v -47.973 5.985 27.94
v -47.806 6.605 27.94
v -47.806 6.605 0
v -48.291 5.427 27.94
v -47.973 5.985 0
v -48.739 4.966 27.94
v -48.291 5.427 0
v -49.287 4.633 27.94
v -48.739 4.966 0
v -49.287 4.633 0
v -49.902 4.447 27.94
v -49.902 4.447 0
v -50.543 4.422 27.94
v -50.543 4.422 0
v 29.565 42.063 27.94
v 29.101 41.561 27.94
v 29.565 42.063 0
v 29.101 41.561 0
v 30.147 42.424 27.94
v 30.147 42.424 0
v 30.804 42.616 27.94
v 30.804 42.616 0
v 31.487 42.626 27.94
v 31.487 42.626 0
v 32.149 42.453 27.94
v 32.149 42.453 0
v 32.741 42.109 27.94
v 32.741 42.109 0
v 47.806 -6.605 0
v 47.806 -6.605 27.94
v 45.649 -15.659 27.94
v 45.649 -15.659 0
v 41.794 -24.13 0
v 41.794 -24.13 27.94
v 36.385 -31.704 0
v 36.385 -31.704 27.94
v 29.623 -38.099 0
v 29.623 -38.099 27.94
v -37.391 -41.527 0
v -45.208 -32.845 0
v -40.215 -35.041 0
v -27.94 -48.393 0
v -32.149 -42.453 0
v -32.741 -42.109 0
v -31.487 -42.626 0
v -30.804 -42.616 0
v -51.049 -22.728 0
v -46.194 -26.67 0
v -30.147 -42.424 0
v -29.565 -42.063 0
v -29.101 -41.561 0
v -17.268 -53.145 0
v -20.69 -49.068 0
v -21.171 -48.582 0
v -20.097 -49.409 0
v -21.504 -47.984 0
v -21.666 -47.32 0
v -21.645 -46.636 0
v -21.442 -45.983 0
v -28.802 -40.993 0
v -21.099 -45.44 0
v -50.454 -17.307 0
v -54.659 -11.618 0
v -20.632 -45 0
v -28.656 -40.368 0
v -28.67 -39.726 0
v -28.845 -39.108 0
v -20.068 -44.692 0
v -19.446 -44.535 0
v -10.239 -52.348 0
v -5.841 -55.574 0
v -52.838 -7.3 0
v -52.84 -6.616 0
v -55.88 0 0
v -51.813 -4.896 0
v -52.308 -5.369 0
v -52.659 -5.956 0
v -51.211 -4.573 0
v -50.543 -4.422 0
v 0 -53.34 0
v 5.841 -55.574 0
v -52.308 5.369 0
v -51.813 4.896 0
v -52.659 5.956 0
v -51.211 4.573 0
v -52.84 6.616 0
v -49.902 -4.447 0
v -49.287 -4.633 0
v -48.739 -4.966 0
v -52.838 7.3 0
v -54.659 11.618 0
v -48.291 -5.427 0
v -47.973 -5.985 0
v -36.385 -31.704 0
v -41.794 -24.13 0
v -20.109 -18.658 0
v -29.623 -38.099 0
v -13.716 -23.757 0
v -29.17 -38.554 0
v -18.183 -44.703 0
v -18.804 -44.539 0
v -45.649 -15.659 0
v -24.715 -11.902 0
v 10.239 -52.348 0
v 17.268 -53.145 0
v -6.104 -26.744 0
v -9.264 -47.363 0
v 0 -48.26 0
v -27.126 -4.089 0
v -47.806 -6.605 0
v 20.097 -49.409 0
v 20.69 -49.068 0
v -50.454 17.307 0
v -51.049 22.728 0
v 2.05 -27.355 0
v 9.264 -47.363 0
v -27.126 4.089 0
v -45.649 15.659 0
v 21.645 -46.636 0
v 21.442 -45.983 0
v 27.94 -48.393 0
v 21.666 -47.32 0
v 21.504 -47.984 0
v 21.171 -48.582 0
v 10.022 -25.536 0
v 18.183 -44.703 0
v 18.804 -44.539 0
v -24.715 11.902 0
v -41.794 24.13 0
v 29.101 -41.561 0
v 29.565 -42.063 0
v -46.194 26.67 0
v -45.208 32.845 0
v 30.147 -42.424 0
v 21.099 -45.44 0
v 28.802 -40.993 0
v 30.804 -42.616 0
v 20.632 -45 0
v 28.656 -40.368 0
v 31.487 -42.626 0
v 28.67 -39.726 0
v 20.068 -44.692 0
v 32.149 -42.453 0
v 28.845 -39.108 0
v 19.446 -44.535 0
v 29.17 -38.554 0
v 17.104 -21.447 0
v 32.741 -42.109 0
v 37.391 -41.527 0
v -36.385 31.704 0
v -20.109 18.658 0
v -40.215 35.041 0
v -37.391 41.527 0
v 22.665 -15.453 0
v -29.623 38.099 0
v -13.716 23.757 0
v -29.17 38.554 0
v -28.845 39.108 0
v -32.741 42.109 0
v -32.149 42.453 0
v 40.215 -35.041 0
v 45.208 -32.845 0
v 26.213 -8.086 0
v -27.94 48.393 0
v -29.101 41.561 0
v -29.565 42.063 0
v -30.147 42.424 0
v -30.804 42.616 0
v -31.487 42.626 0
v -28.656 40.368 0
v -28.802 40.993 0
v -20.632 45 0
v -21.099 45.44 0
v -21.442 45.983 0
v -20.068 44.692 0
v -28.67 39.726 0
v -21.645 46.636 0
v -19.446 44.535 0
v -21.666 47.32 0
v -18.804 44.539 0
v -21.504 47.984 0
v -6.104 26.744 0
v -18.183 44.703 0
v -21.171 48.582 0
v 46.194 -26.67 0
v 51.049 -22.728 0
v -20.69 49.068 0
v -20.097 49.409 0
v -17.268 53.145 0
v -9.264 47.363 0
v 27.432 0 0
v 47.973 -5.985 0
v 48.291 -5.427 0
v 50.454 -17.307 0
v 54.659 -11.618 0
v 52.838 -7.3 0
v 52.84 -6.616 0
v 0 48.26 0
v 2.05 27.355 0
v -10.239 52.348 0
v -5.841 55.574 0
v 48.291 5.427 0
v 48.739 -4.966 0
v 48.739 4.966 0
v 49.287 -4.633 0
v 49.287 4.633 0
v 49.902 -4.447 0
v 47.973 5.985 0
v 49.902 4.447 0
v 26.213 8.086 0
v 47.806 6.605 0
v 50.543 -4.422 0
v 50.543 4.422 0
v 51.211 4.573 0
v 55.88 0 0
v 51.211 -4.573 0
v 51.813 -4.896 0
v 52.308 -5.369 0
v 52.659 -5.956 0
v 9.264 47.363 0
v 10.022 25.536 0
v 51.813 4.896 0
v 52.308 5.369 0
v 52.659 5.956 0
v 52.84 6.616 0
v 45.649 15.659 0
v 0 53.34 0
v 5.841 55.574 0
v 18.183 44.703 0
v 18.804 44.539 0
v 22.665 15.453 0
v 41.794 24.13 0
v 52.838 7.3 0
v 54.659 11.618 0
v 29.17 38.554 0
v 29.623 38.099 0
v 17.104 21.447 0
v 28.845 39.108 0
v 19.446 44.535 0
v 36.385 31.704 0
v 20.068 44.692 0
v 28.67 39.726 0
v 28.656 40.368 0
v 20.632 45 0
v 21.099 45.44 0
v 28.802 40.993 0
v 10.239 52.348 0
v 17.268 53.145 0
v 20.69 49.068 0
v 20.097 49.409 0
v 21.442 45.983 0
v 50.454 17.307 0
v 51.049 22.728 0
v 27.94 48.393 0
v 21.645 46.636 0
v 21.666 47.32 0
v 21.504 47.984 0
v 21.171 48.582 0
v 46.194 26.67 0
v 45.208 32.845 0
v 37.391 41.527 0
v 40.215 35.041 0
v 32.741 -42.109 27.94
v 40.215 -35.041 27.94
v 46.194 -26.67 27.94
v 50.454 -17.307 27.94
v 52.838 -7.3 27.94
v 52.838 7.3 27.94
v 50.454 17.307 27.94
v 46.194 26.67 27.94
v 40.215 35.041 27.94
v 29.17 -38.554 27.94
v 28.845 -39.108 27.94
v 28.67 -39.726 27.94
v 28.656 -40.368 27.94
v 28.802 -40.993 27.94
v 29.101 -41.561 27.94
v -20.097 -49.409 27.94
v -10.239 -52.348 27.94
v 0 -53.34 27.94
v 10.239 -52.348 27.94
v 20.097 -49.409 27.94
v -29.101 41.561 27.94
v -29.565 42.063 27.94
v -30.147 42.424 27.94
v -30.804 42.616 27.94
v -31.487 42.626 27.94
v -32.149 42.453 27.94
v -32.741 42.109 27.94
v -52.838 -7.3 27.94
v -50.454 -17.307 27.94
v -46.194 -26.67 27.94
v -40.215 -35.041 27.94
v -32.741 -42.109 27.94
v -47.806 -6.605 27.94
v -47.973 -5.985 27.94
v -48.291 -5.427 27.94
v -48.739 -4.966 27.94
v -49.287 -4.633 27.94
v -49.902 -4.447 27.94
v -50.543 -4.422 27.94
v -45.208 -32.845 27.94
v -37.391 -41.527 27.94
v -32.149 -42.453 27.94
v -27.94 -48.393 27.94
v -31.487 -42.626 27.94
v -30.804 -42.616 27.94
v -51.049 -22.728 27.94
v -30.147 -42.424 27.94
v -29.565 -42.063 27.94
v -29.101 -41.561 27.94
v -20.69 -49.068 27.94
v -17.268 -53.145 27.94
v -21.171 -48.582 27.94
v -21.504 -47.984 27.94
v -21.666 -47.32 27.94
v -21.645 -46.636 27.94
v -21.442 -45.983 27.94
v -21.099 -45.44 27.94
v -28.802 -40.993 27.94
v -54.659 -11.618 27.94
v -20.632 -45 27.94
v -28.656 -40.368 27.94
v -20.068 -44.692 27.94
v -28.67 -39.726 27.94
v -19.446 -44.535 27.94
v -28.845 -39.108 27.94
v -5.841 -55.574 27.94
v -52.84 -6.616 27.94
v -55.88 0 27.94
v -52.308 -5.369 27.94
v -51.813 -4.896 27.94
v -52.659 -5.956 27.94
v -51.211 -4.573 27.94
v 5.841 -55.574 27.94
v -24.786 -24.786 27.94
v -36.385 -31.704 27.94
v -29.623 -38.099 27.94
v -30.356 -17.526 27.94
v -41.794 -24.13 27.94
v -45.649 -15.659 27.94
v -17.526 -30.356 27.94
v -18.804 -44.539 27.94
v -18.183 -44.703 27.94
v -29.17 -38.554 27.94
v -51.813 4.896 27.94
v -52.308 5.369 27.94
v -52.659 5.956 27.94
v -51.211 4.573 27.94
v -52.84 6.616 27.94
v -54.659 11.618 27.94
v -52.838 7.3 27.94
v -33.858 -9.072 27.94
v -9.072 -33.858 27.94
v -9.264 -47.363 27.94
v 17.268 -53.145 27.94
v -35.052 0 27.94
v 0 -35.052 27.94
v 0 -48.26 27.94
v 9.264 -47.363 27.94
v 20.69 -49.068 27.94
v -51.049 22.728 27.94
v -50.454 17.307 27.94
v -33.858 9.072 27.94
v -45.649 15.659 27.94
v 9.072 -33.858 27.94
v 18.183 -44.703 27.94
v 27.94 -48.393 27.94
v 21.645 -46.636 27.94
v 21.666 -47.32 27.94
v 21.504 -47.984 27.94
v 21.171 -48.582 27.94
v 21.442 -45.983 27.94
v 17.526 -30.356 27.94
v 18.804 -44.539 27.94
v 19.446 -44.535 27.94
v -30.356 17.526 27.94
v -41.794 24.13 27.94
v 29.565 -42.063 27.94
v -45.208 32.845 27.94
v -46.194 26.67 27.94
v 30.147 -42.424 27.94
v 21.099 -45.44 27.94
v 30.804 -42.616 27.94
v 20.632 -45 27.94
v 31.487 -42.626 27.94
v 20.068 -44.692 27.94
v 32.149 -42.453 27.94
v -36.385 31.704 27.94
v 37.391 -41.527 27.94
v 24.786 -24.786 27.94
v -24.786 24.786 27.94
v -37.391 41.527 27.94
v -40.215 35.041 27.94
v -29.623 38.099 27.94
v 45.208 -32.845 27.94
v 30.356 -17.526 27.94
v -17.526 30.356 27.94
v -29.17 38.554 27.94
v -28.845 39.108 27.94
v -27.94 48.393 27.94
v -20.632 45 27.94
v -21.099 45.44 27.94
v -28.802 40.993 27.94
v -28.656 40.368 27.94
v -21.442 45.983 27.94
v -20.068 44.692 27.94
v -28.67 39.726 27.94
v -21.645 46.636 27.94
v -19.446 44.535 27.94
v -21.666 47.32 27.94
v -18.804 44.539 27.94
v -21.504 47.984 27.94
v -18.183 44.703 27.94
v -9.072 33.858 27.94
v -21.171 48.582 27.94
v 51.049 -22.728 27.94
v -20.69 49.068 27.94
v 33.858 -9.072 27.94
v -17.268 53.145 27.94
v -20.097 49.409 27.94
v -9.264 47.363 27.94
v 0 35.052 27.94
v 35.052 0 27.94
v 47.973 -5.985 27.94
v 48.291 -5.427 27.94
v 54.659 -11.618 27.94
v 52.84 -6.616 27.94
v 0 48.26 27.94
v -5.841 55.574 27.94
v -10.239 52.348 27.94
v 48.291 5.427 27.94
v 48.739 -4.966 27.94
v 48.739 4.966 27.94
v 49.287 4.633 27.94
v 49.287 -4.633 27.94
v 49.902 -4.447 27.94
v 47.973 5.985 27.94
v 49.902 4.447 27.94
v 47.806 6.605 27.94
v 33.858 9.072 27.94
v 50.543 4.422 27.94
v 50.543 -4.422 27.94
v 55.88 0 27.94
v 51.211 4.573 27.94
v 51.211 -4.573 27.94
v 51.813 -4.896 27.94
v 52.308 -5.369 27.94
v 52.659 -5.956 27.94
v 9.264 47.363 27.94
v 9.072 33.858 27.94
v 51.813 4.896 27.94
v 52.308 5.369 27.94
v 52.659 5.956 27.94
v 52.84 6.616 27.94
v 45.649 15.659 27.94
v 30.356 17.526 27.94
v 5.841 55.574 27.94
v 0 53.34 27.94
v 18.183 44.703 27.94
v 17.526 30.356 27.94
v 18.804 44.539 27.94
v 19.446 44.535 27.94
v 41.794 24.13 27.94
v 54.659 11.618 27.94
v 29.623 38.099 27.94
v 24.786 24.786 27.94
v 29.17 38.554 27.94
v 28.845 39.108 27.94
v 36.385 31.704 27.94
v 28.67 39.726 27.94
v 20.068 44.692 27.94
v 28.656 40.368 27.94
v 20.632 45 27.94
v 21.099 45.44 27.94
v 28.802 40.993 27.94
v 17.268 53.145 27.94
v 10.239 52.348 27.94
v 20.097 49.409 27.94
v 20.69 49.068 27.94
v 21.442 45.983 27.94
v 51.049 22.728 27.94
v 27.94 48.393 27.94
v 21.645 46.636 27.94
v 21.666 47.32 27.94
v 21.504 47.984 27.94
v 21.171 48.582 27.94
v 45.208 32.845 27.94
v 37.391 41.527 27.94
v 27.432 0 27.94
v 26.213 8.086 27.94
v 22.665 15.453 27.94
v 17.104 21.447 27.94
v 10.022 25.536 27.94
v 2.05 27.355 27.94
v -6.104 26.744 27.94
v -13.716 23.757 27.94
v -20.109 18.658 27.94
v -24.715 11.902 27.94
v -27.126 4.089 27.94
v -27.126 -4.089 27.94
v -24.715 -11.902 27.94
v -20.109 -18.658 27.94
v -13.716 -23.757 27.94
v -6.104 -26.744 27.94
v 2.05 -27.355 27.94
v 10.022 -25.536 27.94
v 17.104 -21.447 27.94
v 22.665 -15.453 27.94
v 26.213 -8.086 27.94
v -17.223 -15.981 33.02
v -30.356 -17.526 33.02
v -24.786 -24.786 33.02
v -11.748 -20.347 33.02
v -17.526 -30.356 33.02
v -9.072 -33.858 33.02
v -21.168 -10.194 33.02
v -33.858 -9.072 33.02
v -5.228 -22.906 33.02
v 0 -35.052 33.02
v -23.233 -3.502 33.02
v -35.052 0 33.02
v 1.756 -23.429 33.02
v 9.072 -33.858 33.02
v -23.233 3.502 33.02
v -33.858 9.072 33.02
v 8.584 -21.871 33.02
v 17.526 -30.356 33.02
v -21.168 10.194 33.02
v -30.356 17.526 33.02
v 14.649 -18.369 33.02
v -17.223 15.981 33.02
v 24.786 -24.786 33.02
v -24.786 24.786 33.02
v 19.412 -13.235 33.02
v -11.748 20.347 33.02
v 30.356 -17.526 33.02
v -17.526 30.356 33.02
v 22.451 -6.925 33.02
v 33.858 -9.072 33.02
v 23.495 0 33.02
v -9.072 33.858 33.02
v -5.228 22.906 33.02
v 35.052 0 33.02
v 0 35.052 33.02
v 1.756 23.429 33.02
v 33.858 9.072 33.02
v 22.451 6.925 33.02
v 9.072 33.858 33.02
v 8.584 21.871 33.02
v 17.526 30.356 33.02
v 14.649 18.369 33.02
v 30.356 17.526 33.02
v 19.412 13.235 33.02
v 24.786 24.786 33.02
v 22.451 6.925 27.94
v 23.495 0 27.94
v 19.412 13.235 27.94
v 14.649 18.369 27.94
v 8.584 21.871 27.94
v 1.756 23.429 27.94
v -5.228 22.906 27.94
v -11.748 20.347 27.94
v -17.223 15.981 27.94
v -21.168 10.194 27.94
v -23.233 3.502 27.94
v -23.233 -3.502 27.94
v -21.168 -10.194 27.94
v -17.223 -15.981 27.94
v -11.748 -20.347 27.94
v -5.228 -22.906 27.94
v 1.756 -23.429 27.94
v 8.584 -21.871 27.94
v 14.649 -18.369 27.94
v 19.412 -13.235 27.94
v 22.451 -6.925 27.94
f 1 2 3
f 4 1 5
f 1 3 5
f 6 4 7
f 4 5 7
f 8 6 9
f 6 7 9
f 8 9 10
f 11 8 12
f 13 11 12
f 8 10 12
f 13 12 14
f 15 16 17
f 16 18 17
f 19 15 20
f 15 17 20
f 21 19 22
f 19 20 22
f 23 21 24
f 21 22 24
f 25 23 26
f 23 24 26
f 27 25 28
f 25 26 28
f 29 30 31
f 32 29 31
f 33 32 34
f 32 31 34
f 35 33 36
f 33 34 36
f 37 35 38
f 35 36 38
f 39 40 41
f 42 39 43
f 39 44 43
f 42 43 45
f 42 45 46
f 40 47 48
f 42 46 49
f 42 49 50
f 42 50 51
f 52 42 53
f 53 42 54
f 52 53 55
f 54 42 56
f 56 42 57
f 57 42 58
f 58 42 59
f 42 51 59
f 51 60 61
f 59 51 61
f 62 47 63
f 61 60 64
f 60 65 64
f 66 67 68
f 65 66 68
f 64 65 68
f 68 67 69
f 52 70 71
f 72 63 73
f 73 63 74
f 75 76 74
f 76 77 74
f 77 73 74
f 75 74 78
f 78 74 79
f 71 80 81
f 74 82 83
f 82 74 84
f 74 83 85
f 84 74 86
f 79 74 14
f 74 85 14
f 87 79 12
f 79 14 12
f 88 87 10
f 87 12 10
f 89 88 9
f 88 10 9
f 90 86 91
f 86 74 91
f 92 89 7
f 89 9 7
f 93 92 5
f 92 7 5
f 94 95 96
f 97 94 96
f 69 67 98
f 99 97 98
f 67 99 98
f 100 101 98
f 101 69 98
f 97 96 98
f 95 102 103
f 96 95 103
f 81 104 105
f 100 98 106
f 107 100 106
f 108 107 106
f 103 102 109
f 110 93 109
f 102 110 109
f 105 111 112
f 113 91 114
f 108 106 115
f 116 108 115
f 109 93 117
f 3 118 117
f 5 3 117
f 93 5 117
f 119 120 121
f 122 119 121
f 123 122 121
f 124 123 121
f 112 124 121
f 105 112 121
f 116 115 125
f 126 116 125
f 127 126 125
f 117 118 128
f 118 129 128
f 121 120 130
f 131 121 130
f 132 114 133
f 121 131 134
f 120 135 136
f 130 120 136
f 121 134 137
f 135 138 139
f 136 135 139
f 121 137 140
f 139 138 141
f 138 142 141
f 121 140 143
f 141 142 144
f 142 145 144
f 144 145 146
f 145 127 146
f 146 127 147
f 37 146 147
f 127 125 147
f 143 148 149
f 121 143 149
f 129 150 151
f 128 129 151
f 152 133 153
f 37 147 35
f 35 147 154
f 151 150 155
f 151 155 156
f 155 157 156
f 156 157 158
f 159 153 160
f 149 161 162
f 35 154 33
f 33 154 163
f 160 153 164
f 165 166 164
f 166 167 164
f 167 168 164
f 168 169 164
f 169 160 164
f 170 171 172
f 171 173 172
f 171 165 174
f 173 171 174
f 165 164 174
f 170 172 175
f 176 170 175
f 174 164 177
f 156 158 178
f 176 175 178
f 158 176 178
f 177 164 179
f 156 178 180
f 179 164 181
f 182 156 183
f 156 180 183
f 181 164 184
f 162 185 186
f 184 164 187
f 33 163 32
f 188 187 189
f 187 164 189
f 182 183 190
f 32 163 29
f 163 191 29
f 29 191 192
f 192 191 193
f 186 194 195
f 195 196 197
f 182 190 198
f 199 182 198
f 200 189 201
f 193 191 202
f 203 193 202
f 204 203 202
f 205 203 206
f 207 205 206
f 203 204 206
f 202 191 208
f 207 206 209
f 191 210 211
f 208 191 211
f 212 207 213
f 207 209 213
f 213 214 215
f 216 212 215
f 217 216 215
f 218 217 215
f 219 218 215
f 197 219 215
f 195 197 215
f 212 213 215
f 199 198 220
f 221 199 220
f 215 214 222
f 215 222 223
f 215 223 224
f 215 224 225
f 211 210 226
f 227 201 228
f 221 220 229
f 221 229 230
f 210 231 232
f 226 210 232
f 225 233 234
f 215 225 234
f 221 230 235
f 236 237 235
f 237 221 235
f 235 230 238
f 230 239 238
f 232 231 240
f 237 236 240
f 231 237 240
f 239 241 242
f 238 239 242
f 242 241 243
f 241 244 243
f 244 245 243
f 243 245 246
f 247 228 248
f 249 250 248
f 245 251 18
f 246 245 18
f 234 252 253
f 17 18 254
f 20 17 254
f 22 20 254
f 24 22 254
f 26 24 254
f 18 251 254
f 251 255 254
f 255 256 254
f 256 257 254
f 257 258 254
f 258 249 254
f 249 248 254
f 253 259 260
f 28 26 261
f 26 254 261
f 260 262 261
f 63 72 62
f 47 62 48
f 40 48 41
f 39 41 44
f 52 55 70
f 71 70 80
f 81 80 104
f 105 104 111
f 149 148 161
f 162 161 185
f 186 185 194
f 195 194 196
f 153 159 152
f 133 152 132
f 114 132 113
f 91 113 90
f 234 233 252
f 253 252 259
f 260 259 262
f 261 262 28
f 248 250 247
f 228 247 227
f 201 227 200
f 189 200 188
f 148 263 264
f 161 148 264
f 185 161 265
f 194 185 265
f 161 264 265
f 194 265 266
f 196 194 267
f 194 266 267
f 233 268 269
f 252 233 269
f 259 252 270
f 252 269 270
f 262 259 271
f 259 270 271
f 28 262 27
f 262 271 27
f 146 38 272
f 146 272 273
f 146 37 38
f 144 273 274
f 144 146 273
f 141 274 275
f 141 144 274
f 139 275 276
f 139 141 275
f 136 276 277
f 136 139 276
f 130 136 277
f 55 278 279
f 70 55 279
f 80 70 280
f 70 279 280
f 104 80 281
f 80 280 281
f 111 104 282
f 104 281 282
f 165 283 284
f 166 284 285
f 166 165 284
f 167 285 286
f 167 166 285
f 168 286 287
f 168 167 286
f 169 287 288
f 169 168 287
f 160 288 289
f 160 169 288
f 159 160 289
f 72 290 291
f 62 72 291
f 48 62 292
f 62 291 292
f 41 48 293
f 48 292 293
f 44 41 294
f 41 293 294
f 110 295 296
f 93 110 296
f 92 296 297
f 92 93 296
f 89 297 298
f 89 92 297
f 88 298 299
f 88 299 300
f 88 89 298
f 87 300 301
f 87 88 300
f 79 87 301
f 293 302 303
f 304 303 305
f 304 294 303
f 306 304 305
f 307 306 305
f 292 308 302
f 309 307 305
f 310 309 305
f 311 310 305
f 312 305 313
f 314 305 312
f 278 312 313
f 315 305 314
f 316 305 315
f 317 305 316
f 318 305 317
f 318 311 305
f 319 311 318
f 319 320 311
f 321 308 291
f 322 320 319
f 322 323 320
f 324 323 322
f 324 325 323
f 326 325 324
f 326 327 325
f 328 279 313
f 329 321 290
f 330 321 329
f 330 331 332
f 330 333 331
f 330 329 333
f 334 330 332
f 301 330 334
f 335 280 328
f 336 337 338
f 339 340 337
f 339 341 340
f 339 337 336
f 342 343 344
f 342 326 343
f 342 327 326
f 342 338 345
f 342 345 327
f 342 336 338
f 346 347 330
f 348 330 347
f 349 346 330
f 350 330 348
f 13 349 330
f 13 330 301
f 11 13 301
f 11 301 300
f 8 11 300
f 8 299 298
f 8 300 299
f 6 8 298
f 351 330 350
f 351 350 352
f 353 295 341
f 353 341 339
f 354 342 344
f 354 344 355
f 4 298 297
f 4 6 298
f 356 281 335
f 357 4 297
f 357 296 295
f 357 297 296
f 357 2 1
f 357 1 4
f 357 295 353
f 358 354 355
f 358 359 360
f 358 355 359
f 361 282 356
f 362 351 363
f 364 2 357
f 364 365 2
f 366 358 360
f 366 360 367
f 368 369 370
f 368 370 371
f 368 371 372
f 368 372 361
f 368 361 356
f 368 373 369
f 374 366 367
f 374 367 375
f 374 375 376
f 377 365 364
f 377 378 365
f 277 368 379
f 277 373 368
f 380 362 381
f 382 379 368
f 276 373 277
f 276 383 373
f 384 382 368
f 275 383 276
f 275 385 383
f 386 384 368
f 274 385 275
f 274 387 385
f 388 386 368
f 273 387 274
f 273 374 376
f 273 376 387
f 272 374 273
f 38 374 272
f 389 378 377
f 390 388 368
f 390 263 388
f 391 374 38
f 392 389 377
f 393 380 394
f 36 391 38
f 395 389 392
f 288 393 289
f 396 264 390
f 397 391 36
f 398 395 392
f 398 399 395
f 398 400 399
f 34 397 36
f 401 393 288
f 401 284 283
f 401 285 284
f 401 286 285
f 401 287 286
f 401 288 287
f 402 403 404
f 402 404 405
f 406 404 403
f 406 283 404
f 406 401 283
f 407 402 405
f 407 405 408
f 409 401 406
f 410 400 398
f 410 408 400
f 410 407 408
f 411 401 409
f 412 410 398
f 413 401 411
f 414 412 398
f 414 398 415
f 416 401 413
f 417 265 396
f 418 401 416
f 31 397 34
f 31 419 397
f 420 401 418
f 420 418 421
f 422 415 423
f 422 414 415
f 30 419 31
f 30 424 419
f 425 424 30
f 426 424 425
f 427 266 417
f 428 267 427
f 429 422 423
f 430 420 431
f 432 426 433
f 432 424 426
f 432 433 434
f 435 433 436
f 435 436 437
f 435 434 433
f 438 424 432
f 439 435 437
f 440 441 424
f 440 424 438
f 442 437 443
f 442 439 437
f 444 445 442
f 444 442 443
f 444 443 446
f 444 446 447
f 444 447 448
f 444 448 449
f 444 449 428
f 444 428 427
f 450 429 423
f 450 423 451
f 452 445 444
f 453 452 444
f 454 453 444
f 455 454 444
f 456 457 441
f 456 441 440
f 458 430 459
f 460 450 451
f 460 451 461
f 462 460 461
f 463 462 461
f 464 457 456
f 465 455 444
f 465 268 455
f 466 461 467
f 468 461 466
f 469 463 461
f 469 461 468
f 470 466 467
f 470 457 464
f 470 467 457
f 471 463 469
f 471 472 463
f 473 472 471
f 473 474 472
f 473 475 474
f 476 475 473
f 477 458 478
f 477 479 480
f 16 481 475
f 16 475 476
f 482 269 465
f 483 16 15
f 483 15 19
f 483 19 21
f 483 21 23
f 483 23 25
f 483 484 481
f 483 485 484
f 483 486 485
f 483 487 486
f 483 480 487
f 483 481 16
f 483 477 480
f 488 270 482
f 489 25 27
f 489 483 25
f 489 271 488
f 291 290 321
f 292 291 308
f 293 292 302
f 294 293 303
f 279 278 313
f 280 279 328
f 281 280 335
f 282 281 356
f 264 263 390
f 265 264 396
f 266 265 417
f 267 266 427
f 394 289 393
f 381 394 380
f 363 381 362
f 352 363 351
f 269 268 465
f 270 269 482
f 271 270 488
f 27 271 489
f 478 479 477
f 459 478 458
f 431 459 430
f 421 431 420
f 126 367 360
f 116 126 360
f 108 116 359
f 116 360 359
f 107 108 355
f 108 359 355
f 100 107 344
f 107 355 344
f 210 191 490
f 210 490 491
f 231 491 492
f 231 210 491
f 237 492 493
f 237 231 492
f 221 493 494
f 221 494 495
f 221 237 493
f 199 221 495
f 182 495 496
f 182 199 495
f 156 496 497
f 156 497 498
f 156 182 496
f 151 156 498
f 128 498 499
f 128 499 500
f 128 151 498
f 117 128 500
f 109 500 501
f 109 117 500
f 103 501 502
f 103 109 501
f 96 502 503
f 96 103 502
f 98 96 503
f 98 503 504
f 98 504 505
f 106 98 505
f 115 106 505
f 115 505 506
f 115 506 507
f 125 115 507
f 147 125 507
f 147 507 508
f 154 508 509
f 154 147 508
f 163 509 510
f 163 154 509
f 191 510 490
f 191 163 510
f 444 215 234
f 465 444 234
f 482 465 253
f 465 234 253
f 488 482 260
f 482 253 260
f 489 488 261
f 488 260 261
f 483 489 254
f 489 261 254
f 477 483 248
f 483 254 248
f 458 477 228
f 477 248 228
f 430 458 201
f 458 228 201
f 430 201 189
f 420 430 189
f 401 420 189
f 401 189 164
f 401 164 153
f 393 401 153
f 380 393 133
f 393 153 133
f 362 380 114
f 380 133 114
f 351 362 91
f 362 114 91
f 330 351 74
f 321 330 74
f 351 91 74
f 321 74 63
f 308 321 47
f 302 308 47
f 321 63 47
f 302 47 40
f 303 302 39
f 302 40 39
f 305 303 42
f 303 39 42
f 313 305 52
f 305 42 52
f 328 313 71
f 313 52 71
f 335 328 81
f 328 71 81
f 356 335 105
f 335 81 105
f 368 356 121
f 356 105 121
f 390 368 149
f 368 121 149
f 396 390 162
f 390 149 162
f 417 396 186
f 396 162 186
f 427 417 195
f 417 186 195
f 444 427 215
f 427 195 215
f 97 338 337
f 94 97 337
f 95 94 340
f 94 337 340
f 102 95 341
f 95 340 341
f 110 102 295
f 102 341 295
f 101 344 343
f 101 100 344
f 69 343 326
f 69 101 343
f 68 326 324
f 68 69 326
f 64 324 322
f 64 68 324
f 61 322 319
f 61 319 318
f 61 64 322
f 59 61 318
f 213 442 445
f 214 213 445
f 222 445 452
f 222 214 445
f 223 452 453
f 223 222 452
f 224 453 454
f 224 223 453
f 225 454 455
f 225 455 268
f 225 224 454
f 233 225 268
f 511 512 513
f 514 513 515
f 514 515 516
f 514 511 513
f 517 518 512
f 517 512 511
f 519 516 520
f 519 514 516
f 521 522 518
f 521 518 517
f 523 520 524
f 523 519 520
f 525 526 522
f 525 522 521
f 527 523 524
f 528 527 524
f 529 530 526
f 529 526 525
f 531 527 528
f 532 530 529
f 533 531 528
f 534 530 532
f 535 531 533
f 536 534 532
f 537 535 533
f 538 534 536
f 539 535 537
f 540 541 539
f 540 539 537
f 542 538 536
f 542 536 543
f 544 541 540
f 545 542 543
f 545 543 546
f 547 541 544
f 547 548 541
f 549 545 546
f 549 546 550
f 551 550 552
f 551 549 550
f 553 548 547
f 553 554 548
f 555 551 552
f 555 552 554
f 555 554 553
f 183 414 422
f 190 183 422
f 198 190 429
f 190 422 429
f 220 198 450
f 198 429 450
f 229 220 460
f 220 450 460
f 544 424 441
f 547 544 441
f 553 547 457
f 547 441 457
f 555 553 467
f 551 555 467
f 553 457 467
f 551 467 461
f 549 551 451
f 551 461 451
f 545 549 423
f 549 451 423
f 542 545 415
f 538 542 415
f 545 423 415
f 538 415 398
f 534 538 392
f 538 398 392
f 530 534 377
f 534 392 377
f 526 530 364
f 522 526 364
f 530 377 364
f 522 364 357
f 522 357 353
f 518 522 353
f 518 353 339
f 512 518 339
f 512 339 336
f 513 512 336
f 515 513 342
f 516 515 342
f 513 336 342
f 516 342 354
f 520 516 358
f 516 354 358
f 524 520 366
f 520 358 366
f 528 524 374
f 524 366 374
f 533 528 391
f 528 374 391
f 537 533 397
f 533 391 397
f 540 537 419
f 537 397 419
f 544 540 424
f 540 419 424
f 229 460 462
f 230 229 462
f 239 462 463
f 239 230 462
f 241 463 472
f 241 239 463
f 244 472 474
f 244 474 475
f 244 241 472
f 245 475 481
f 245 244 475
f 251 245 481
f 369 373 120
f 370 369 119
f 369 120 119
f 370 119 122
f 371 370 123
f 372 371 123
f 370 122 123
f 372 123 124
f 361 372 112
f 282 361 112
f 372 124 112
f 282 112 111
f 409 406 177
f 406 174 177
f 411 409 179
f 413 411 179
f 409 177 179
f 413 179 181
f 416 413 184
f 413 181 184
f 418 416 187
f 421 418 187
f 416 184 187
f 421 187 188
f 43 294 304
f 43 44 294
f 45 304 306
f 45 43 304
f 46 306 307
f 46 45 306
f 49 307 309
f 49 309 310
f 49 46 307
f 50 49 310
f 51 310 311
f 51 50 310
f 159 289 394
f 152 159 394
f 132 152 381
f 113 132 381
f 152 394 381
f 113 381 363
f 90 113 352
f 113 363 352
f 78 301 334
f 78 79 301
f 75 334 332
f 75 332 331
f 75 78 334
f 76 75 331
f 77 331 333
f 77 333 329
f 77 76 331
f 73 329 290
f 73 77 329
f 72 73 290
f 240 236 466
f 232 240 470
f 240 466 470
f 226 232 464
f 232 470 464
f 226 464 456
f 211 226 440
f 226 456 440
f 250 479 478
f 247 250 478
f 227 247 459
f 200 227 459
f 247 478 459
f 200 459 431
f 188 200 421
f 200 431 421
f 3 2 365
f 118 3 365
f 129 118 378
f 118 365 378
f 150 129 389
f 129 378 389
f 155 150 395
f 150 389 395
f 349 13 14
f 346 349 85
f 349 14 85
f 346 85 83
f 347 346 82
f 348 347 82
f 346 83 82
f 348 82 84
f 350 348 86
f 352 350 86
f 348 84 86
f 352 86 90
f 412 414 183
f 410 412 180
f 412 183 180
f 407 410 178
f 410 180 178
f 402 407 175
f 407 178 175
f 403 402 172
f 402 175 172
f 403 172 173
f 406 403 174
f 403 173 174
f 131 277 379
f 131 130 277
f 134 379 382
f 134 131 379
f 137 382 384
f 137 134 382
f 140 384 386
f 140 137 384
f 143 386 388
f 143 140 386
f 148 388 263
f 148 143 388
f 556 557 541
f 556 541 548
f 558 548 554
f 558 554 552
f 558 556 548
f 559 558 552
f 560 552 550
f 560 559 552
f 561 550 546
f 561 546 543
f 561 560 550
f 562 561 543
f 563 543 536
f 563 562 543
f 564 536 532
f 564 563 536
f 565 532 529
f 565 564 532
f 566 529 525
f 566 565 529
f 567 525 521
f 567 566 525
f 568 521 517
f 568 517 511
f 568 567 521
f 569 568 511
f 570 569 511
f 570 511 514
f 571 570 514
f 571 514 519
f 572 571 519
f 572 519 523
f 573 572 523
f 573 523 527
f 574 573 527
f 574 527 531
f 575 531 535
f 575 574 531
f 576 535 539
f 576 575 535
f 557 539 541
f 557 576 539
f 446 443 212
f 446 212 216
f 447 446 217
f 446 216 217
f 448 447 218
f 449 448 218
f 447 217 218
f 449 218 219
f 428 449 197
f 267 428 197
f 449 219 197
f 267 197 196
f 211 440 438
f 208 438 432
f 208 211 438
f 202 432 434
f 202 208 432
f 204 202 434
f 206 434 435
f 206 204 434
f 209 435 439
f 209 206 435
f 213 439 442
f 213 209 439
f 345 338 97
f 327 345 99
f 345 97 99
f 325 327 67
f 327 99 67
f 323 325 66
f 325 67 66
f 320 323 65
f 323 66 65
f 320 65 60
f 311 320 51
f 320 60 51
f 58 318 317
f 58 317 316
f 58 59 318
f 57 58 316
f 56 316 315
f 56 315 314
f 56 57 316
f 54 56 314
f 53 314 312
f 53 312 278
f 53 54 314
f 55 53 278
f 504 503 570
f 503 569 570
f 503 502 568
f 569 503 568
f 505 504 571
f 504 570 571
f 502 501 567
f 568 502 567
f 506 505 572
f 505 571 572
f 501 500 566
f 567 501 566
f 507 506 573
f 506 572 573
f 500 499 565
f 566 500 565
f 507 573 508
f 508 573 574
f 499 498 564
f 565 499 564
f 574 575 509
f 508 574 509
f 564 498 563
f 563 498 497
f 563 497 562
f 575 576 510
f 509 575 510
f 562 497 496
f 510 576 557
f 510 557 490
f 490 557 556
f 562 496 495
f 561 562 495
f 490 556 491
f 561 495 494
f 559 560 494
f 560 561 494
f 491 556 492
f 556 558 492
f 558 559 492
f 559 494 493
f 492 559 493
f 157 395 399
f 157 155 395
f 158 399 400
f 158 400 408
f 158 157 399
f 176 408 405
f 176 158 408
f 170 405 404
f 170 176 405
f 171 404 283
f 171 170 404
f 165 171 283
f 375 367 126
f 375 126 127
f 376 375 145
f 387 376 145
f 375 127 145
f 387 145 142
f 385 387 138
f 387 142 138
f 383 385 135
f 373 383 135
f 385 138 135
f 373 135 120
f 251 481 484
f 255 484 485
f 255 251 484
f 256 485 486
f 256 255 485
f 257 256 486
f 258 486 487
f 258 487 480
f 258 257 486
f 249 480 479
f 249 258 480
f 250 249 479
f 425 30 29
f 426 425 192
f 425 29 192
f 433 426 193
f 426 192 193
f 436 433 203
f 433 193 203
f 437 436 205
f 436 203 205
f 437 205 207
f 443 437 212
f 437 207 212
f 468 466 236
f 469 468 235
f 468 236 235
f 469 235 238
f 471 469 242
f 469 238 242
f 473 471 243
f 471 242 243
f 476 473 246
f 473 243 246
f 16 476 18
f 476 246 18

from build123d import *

# Parameters (mm, degrees)
F0_R            = 55.88
F0_R_2          = 27.432
F1_DEPTH        = 27.94
F2_R            = 35.052
F2_R_2          = 23.495
F3_DEPTH        = 5.08
F5_DEPTH        = 27.941
F5_COPIES_COUNT = 6
F6_R            = 2.53999


# Not quite as in the source:
# - a fillet or chamfer is up to 0.001 mm smaller than in the source, because OpenCascade refuses the exact size
# - a pattern or mirror of a feature is missing from the dataset's text; its kind, count and spacing are read off the source's solid


with BuildPart() as f1:
    # F0 (on Top) → F1 (new body)
    with BuildSketch(Plane.XY):
        Circle(F0_R)
        Circle(F0_R_2, mode=Mode.SUBTRACT)
    extrude(amount=F1_DEPTH)

    # F2 (on face) → F3 (join)
    with BuildSketch(Plane.XY.offset(27.94)):
        Circle(F2_R)
        Circle(F2_R_2, mode=Mode.SUBTRACT)
    extrude(amount=F3_DEPTH)

    # F4 (on face) → F5 (cut, through all)
    with BuildSketch(Plane.XY.offset(27.94)):
        with BuildLine():
            ThreePointArc((20.3955573116, -43.7384138024), (0, -48.26), (-20.3955573116, -43.7384138024))
            Line((-20.3955573116, -43.7384138024), (-22.5424580812, -48.3424573605))
            ThreePointArc((-22.5424580812, -48.3424573605), (0, -53.34), (22.5424580812, -48.3424573605))
            Line((22.5424580812, -48.3424573605), (20.3955573116, -43.7384138024))
        make_face()
    f5 = extrude(amount=-F5_DEPTH, mode=Mode.SUBTRACT)

    # F5_copies: F5 ×6 about axis
    f5_copies_axis = Axis((0, 0, 0), (0, 0, 1))
    for i in range(1, F5_COPIES_COUNT):
        add(f5.rotate(f5_copies_axis, i * 360 / F5_COPIES_COUNT), mode=Mode.SUBTRACT)

    # F6 (radius 2.54 in the source; OpenCascade refuses exactly that, so slightly less here)
    f6_edges = [f1.edges().sort_by_distance(p)[0] for p in [
        (-22.542458, -48.342457, 13.97),
        (-20.395557, -43.738414, 13.97),
        (22.542458, -48.342457, 13.97),
        (20.395557, -43.738414, 13.97),
        (-53.137025, -4.648887, 13.97),
        (-48.076356, -4.206136, 13.97),
        (-30.594567, -43.69357, 13.97),
        (-27.680799, -39.532278, 13.97),
        (30.594567, -43.69357, 13.97),
        (27.680799, -39.532278, 13.97),
        (48.076356, -4.206136, 13.97),
        (53.137025, -4.648887, 13.97),
        (-30.594567, 43.69357, 13.97),
        (-27.680799, 39.532278, 13.97),
        (-48.076356, 4.206136, 13.97),
        (-53.137025, 4.648887, 13.97),
        (22.542458, 48.342457, 13.97),
        (20.395557, 43.738414, 13.97),
        (-20.395557, 43.738414, 13.97),
        (-22.542458, 48.342457, 13.97),
        (53.137025, 4.648887, 13.97),
        (48.076356, 4.206136, 13.97),
        (27.680799, 39.532278, 13.97),
        (30.594567, 43.69357, 13.97),
    ]]
    fillet(f6_edges, radius=F6_R)


solid = f1.part
